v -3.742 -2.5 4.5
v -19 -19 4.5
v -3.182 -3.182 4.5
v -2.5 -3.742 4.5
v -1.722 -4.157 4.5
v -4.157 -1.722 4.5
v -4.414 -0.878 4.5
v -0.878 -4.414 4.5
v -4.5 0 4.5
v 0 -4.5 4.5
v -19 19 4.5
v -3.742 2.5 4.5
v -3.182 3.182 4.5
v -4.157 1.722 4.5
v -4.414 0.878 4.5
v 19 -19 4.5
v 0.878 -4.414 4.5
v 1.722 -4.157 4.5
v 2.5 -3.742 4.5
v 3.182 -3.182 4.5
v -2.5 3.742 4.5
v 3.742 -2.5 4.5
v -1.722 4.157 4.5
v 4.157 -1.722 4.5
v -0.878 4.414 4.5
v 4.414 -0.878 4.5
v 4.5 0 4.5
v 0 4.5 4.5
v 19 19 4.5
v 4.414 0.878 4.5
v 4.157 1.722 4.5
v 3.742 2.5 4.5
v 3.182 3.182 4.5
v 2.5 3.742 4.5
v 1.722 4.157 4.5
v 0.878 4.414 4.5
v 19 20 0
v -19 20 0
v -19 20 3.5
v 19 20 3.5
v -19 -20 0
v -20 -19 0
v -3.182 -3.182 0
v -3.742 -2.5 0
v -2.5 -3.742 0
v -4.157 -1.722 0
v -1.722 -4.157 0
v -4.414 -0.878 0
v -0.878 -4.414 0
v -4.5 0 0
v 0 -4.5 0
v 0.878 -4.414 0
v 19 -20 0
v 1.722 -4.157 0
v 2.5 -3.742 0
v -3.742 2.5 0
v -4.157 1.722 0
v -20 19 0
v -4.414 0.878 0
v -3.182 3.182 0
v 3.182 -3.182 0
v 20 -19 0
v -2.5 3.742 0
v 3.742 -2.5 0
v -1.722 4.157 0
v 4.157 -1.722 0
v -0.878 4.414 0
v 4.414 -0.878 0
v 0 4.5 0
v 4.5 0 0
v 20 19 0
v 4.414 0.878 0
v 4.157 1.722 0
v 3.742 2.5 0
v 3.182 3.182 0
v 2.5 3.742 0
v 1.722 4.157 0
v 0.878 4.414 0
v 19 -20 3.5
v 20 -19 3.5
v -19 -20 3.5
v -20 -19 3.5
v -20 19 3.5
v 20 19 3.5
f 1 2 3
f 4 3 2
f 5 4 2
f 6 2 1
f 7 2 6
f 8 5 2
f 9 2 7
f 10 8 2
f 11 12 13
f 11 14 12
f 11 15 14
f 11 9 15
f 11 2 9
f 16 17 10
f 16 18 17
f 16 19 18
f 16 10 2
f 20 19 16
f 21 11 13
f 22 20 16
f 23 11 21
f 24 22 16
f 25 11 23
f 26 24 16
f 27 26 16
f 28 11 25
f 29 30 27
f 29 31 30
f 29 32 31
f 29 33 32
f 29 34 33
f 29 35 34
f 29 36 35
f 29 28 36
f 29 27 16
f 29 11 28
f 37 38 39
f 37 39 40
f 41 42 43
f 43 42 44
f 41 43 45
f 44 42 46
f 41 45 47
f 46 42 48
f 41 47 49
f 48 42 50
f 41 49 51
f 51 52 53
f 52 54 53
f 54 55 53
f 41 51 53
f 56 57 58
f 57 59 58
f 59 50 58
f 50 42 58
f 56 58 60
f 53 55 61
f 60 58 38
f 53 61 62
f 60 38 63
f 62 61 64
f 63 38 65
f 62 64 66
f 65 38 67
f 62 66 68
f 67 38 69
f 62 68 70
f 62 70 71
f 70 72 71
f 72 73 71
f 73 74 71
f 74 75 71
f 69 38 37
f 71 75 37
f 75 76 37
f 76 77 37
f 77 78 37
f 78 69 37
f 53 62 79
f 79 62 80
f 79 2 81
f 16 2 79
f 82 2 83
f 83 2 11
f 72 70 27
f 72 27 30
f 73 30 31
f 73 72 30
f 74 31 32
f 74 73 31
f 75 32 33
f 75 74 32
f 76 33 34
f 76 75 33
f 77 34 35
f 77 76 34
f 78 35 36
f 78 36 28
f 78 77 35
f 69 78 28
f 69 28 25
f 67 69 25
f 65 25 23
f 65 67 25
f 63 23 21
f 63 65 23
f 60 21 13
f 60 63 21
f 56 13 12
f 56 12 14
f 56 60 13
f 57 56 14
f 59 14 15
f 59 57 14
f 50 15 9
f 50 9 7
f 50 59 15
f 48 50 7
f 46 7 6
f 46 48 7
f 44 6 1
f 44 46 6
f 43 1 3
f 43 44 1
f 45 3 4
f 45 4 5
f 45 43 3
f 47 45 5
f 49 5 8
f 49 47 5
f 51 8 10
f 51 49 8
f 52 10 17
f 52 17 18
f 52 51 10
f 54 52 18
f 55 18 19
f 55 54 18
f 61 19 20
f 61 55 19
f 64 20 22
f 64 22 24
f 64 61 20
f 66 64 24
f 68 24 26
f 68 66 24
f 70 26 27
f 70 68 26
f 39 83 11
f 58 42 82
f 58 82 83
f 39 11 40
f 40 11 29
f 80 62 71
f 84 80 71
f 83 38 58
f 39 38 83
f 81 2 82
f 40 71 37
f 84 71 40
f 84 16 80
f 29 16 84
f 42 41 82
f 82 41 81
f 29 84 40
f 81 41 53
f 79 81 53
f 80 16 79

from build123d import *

# Parameters (mm, degrees)
CROQUIS1_W              = 40
CROQUIS1_H              = 40
CROQUIS1_R              = 4.5
SALIENTE_EXTRUIR1_DEPTH = 4.5
CHAFL_N1_SIZE           = 1


with BuildPart() as part:
    # Croquis1 → Saliente-Extruir1 (new body)
    with BuildSketch(Plane.XY):
        Rectangle(CROQUIS1_W, CROQUIS1_H)
        Circle(CROQUIS1_R, mode=Mode.SUBTRACT)
    extrude(amount=SALIENTE_EXTRUIR1_DEPTH)

    # Chaflán1
    chafl_n1_edges = [part.edges().sort_by_distance(p)[0] for p in [
        (-20, 0, 4.5),
        (0, -20, 4.5),
        (20, 0, 4.5),
        (20, -20, 2.25),
        (-20, -20, 2.25),
        (-20, 20, 2.25),
        (20, 20, 2.25),
        (0, 20, 4.5),
    ]]
    chamfer(chafl_n1_edges, length=CHAFL_N1_SIZE)


solid = part.part
